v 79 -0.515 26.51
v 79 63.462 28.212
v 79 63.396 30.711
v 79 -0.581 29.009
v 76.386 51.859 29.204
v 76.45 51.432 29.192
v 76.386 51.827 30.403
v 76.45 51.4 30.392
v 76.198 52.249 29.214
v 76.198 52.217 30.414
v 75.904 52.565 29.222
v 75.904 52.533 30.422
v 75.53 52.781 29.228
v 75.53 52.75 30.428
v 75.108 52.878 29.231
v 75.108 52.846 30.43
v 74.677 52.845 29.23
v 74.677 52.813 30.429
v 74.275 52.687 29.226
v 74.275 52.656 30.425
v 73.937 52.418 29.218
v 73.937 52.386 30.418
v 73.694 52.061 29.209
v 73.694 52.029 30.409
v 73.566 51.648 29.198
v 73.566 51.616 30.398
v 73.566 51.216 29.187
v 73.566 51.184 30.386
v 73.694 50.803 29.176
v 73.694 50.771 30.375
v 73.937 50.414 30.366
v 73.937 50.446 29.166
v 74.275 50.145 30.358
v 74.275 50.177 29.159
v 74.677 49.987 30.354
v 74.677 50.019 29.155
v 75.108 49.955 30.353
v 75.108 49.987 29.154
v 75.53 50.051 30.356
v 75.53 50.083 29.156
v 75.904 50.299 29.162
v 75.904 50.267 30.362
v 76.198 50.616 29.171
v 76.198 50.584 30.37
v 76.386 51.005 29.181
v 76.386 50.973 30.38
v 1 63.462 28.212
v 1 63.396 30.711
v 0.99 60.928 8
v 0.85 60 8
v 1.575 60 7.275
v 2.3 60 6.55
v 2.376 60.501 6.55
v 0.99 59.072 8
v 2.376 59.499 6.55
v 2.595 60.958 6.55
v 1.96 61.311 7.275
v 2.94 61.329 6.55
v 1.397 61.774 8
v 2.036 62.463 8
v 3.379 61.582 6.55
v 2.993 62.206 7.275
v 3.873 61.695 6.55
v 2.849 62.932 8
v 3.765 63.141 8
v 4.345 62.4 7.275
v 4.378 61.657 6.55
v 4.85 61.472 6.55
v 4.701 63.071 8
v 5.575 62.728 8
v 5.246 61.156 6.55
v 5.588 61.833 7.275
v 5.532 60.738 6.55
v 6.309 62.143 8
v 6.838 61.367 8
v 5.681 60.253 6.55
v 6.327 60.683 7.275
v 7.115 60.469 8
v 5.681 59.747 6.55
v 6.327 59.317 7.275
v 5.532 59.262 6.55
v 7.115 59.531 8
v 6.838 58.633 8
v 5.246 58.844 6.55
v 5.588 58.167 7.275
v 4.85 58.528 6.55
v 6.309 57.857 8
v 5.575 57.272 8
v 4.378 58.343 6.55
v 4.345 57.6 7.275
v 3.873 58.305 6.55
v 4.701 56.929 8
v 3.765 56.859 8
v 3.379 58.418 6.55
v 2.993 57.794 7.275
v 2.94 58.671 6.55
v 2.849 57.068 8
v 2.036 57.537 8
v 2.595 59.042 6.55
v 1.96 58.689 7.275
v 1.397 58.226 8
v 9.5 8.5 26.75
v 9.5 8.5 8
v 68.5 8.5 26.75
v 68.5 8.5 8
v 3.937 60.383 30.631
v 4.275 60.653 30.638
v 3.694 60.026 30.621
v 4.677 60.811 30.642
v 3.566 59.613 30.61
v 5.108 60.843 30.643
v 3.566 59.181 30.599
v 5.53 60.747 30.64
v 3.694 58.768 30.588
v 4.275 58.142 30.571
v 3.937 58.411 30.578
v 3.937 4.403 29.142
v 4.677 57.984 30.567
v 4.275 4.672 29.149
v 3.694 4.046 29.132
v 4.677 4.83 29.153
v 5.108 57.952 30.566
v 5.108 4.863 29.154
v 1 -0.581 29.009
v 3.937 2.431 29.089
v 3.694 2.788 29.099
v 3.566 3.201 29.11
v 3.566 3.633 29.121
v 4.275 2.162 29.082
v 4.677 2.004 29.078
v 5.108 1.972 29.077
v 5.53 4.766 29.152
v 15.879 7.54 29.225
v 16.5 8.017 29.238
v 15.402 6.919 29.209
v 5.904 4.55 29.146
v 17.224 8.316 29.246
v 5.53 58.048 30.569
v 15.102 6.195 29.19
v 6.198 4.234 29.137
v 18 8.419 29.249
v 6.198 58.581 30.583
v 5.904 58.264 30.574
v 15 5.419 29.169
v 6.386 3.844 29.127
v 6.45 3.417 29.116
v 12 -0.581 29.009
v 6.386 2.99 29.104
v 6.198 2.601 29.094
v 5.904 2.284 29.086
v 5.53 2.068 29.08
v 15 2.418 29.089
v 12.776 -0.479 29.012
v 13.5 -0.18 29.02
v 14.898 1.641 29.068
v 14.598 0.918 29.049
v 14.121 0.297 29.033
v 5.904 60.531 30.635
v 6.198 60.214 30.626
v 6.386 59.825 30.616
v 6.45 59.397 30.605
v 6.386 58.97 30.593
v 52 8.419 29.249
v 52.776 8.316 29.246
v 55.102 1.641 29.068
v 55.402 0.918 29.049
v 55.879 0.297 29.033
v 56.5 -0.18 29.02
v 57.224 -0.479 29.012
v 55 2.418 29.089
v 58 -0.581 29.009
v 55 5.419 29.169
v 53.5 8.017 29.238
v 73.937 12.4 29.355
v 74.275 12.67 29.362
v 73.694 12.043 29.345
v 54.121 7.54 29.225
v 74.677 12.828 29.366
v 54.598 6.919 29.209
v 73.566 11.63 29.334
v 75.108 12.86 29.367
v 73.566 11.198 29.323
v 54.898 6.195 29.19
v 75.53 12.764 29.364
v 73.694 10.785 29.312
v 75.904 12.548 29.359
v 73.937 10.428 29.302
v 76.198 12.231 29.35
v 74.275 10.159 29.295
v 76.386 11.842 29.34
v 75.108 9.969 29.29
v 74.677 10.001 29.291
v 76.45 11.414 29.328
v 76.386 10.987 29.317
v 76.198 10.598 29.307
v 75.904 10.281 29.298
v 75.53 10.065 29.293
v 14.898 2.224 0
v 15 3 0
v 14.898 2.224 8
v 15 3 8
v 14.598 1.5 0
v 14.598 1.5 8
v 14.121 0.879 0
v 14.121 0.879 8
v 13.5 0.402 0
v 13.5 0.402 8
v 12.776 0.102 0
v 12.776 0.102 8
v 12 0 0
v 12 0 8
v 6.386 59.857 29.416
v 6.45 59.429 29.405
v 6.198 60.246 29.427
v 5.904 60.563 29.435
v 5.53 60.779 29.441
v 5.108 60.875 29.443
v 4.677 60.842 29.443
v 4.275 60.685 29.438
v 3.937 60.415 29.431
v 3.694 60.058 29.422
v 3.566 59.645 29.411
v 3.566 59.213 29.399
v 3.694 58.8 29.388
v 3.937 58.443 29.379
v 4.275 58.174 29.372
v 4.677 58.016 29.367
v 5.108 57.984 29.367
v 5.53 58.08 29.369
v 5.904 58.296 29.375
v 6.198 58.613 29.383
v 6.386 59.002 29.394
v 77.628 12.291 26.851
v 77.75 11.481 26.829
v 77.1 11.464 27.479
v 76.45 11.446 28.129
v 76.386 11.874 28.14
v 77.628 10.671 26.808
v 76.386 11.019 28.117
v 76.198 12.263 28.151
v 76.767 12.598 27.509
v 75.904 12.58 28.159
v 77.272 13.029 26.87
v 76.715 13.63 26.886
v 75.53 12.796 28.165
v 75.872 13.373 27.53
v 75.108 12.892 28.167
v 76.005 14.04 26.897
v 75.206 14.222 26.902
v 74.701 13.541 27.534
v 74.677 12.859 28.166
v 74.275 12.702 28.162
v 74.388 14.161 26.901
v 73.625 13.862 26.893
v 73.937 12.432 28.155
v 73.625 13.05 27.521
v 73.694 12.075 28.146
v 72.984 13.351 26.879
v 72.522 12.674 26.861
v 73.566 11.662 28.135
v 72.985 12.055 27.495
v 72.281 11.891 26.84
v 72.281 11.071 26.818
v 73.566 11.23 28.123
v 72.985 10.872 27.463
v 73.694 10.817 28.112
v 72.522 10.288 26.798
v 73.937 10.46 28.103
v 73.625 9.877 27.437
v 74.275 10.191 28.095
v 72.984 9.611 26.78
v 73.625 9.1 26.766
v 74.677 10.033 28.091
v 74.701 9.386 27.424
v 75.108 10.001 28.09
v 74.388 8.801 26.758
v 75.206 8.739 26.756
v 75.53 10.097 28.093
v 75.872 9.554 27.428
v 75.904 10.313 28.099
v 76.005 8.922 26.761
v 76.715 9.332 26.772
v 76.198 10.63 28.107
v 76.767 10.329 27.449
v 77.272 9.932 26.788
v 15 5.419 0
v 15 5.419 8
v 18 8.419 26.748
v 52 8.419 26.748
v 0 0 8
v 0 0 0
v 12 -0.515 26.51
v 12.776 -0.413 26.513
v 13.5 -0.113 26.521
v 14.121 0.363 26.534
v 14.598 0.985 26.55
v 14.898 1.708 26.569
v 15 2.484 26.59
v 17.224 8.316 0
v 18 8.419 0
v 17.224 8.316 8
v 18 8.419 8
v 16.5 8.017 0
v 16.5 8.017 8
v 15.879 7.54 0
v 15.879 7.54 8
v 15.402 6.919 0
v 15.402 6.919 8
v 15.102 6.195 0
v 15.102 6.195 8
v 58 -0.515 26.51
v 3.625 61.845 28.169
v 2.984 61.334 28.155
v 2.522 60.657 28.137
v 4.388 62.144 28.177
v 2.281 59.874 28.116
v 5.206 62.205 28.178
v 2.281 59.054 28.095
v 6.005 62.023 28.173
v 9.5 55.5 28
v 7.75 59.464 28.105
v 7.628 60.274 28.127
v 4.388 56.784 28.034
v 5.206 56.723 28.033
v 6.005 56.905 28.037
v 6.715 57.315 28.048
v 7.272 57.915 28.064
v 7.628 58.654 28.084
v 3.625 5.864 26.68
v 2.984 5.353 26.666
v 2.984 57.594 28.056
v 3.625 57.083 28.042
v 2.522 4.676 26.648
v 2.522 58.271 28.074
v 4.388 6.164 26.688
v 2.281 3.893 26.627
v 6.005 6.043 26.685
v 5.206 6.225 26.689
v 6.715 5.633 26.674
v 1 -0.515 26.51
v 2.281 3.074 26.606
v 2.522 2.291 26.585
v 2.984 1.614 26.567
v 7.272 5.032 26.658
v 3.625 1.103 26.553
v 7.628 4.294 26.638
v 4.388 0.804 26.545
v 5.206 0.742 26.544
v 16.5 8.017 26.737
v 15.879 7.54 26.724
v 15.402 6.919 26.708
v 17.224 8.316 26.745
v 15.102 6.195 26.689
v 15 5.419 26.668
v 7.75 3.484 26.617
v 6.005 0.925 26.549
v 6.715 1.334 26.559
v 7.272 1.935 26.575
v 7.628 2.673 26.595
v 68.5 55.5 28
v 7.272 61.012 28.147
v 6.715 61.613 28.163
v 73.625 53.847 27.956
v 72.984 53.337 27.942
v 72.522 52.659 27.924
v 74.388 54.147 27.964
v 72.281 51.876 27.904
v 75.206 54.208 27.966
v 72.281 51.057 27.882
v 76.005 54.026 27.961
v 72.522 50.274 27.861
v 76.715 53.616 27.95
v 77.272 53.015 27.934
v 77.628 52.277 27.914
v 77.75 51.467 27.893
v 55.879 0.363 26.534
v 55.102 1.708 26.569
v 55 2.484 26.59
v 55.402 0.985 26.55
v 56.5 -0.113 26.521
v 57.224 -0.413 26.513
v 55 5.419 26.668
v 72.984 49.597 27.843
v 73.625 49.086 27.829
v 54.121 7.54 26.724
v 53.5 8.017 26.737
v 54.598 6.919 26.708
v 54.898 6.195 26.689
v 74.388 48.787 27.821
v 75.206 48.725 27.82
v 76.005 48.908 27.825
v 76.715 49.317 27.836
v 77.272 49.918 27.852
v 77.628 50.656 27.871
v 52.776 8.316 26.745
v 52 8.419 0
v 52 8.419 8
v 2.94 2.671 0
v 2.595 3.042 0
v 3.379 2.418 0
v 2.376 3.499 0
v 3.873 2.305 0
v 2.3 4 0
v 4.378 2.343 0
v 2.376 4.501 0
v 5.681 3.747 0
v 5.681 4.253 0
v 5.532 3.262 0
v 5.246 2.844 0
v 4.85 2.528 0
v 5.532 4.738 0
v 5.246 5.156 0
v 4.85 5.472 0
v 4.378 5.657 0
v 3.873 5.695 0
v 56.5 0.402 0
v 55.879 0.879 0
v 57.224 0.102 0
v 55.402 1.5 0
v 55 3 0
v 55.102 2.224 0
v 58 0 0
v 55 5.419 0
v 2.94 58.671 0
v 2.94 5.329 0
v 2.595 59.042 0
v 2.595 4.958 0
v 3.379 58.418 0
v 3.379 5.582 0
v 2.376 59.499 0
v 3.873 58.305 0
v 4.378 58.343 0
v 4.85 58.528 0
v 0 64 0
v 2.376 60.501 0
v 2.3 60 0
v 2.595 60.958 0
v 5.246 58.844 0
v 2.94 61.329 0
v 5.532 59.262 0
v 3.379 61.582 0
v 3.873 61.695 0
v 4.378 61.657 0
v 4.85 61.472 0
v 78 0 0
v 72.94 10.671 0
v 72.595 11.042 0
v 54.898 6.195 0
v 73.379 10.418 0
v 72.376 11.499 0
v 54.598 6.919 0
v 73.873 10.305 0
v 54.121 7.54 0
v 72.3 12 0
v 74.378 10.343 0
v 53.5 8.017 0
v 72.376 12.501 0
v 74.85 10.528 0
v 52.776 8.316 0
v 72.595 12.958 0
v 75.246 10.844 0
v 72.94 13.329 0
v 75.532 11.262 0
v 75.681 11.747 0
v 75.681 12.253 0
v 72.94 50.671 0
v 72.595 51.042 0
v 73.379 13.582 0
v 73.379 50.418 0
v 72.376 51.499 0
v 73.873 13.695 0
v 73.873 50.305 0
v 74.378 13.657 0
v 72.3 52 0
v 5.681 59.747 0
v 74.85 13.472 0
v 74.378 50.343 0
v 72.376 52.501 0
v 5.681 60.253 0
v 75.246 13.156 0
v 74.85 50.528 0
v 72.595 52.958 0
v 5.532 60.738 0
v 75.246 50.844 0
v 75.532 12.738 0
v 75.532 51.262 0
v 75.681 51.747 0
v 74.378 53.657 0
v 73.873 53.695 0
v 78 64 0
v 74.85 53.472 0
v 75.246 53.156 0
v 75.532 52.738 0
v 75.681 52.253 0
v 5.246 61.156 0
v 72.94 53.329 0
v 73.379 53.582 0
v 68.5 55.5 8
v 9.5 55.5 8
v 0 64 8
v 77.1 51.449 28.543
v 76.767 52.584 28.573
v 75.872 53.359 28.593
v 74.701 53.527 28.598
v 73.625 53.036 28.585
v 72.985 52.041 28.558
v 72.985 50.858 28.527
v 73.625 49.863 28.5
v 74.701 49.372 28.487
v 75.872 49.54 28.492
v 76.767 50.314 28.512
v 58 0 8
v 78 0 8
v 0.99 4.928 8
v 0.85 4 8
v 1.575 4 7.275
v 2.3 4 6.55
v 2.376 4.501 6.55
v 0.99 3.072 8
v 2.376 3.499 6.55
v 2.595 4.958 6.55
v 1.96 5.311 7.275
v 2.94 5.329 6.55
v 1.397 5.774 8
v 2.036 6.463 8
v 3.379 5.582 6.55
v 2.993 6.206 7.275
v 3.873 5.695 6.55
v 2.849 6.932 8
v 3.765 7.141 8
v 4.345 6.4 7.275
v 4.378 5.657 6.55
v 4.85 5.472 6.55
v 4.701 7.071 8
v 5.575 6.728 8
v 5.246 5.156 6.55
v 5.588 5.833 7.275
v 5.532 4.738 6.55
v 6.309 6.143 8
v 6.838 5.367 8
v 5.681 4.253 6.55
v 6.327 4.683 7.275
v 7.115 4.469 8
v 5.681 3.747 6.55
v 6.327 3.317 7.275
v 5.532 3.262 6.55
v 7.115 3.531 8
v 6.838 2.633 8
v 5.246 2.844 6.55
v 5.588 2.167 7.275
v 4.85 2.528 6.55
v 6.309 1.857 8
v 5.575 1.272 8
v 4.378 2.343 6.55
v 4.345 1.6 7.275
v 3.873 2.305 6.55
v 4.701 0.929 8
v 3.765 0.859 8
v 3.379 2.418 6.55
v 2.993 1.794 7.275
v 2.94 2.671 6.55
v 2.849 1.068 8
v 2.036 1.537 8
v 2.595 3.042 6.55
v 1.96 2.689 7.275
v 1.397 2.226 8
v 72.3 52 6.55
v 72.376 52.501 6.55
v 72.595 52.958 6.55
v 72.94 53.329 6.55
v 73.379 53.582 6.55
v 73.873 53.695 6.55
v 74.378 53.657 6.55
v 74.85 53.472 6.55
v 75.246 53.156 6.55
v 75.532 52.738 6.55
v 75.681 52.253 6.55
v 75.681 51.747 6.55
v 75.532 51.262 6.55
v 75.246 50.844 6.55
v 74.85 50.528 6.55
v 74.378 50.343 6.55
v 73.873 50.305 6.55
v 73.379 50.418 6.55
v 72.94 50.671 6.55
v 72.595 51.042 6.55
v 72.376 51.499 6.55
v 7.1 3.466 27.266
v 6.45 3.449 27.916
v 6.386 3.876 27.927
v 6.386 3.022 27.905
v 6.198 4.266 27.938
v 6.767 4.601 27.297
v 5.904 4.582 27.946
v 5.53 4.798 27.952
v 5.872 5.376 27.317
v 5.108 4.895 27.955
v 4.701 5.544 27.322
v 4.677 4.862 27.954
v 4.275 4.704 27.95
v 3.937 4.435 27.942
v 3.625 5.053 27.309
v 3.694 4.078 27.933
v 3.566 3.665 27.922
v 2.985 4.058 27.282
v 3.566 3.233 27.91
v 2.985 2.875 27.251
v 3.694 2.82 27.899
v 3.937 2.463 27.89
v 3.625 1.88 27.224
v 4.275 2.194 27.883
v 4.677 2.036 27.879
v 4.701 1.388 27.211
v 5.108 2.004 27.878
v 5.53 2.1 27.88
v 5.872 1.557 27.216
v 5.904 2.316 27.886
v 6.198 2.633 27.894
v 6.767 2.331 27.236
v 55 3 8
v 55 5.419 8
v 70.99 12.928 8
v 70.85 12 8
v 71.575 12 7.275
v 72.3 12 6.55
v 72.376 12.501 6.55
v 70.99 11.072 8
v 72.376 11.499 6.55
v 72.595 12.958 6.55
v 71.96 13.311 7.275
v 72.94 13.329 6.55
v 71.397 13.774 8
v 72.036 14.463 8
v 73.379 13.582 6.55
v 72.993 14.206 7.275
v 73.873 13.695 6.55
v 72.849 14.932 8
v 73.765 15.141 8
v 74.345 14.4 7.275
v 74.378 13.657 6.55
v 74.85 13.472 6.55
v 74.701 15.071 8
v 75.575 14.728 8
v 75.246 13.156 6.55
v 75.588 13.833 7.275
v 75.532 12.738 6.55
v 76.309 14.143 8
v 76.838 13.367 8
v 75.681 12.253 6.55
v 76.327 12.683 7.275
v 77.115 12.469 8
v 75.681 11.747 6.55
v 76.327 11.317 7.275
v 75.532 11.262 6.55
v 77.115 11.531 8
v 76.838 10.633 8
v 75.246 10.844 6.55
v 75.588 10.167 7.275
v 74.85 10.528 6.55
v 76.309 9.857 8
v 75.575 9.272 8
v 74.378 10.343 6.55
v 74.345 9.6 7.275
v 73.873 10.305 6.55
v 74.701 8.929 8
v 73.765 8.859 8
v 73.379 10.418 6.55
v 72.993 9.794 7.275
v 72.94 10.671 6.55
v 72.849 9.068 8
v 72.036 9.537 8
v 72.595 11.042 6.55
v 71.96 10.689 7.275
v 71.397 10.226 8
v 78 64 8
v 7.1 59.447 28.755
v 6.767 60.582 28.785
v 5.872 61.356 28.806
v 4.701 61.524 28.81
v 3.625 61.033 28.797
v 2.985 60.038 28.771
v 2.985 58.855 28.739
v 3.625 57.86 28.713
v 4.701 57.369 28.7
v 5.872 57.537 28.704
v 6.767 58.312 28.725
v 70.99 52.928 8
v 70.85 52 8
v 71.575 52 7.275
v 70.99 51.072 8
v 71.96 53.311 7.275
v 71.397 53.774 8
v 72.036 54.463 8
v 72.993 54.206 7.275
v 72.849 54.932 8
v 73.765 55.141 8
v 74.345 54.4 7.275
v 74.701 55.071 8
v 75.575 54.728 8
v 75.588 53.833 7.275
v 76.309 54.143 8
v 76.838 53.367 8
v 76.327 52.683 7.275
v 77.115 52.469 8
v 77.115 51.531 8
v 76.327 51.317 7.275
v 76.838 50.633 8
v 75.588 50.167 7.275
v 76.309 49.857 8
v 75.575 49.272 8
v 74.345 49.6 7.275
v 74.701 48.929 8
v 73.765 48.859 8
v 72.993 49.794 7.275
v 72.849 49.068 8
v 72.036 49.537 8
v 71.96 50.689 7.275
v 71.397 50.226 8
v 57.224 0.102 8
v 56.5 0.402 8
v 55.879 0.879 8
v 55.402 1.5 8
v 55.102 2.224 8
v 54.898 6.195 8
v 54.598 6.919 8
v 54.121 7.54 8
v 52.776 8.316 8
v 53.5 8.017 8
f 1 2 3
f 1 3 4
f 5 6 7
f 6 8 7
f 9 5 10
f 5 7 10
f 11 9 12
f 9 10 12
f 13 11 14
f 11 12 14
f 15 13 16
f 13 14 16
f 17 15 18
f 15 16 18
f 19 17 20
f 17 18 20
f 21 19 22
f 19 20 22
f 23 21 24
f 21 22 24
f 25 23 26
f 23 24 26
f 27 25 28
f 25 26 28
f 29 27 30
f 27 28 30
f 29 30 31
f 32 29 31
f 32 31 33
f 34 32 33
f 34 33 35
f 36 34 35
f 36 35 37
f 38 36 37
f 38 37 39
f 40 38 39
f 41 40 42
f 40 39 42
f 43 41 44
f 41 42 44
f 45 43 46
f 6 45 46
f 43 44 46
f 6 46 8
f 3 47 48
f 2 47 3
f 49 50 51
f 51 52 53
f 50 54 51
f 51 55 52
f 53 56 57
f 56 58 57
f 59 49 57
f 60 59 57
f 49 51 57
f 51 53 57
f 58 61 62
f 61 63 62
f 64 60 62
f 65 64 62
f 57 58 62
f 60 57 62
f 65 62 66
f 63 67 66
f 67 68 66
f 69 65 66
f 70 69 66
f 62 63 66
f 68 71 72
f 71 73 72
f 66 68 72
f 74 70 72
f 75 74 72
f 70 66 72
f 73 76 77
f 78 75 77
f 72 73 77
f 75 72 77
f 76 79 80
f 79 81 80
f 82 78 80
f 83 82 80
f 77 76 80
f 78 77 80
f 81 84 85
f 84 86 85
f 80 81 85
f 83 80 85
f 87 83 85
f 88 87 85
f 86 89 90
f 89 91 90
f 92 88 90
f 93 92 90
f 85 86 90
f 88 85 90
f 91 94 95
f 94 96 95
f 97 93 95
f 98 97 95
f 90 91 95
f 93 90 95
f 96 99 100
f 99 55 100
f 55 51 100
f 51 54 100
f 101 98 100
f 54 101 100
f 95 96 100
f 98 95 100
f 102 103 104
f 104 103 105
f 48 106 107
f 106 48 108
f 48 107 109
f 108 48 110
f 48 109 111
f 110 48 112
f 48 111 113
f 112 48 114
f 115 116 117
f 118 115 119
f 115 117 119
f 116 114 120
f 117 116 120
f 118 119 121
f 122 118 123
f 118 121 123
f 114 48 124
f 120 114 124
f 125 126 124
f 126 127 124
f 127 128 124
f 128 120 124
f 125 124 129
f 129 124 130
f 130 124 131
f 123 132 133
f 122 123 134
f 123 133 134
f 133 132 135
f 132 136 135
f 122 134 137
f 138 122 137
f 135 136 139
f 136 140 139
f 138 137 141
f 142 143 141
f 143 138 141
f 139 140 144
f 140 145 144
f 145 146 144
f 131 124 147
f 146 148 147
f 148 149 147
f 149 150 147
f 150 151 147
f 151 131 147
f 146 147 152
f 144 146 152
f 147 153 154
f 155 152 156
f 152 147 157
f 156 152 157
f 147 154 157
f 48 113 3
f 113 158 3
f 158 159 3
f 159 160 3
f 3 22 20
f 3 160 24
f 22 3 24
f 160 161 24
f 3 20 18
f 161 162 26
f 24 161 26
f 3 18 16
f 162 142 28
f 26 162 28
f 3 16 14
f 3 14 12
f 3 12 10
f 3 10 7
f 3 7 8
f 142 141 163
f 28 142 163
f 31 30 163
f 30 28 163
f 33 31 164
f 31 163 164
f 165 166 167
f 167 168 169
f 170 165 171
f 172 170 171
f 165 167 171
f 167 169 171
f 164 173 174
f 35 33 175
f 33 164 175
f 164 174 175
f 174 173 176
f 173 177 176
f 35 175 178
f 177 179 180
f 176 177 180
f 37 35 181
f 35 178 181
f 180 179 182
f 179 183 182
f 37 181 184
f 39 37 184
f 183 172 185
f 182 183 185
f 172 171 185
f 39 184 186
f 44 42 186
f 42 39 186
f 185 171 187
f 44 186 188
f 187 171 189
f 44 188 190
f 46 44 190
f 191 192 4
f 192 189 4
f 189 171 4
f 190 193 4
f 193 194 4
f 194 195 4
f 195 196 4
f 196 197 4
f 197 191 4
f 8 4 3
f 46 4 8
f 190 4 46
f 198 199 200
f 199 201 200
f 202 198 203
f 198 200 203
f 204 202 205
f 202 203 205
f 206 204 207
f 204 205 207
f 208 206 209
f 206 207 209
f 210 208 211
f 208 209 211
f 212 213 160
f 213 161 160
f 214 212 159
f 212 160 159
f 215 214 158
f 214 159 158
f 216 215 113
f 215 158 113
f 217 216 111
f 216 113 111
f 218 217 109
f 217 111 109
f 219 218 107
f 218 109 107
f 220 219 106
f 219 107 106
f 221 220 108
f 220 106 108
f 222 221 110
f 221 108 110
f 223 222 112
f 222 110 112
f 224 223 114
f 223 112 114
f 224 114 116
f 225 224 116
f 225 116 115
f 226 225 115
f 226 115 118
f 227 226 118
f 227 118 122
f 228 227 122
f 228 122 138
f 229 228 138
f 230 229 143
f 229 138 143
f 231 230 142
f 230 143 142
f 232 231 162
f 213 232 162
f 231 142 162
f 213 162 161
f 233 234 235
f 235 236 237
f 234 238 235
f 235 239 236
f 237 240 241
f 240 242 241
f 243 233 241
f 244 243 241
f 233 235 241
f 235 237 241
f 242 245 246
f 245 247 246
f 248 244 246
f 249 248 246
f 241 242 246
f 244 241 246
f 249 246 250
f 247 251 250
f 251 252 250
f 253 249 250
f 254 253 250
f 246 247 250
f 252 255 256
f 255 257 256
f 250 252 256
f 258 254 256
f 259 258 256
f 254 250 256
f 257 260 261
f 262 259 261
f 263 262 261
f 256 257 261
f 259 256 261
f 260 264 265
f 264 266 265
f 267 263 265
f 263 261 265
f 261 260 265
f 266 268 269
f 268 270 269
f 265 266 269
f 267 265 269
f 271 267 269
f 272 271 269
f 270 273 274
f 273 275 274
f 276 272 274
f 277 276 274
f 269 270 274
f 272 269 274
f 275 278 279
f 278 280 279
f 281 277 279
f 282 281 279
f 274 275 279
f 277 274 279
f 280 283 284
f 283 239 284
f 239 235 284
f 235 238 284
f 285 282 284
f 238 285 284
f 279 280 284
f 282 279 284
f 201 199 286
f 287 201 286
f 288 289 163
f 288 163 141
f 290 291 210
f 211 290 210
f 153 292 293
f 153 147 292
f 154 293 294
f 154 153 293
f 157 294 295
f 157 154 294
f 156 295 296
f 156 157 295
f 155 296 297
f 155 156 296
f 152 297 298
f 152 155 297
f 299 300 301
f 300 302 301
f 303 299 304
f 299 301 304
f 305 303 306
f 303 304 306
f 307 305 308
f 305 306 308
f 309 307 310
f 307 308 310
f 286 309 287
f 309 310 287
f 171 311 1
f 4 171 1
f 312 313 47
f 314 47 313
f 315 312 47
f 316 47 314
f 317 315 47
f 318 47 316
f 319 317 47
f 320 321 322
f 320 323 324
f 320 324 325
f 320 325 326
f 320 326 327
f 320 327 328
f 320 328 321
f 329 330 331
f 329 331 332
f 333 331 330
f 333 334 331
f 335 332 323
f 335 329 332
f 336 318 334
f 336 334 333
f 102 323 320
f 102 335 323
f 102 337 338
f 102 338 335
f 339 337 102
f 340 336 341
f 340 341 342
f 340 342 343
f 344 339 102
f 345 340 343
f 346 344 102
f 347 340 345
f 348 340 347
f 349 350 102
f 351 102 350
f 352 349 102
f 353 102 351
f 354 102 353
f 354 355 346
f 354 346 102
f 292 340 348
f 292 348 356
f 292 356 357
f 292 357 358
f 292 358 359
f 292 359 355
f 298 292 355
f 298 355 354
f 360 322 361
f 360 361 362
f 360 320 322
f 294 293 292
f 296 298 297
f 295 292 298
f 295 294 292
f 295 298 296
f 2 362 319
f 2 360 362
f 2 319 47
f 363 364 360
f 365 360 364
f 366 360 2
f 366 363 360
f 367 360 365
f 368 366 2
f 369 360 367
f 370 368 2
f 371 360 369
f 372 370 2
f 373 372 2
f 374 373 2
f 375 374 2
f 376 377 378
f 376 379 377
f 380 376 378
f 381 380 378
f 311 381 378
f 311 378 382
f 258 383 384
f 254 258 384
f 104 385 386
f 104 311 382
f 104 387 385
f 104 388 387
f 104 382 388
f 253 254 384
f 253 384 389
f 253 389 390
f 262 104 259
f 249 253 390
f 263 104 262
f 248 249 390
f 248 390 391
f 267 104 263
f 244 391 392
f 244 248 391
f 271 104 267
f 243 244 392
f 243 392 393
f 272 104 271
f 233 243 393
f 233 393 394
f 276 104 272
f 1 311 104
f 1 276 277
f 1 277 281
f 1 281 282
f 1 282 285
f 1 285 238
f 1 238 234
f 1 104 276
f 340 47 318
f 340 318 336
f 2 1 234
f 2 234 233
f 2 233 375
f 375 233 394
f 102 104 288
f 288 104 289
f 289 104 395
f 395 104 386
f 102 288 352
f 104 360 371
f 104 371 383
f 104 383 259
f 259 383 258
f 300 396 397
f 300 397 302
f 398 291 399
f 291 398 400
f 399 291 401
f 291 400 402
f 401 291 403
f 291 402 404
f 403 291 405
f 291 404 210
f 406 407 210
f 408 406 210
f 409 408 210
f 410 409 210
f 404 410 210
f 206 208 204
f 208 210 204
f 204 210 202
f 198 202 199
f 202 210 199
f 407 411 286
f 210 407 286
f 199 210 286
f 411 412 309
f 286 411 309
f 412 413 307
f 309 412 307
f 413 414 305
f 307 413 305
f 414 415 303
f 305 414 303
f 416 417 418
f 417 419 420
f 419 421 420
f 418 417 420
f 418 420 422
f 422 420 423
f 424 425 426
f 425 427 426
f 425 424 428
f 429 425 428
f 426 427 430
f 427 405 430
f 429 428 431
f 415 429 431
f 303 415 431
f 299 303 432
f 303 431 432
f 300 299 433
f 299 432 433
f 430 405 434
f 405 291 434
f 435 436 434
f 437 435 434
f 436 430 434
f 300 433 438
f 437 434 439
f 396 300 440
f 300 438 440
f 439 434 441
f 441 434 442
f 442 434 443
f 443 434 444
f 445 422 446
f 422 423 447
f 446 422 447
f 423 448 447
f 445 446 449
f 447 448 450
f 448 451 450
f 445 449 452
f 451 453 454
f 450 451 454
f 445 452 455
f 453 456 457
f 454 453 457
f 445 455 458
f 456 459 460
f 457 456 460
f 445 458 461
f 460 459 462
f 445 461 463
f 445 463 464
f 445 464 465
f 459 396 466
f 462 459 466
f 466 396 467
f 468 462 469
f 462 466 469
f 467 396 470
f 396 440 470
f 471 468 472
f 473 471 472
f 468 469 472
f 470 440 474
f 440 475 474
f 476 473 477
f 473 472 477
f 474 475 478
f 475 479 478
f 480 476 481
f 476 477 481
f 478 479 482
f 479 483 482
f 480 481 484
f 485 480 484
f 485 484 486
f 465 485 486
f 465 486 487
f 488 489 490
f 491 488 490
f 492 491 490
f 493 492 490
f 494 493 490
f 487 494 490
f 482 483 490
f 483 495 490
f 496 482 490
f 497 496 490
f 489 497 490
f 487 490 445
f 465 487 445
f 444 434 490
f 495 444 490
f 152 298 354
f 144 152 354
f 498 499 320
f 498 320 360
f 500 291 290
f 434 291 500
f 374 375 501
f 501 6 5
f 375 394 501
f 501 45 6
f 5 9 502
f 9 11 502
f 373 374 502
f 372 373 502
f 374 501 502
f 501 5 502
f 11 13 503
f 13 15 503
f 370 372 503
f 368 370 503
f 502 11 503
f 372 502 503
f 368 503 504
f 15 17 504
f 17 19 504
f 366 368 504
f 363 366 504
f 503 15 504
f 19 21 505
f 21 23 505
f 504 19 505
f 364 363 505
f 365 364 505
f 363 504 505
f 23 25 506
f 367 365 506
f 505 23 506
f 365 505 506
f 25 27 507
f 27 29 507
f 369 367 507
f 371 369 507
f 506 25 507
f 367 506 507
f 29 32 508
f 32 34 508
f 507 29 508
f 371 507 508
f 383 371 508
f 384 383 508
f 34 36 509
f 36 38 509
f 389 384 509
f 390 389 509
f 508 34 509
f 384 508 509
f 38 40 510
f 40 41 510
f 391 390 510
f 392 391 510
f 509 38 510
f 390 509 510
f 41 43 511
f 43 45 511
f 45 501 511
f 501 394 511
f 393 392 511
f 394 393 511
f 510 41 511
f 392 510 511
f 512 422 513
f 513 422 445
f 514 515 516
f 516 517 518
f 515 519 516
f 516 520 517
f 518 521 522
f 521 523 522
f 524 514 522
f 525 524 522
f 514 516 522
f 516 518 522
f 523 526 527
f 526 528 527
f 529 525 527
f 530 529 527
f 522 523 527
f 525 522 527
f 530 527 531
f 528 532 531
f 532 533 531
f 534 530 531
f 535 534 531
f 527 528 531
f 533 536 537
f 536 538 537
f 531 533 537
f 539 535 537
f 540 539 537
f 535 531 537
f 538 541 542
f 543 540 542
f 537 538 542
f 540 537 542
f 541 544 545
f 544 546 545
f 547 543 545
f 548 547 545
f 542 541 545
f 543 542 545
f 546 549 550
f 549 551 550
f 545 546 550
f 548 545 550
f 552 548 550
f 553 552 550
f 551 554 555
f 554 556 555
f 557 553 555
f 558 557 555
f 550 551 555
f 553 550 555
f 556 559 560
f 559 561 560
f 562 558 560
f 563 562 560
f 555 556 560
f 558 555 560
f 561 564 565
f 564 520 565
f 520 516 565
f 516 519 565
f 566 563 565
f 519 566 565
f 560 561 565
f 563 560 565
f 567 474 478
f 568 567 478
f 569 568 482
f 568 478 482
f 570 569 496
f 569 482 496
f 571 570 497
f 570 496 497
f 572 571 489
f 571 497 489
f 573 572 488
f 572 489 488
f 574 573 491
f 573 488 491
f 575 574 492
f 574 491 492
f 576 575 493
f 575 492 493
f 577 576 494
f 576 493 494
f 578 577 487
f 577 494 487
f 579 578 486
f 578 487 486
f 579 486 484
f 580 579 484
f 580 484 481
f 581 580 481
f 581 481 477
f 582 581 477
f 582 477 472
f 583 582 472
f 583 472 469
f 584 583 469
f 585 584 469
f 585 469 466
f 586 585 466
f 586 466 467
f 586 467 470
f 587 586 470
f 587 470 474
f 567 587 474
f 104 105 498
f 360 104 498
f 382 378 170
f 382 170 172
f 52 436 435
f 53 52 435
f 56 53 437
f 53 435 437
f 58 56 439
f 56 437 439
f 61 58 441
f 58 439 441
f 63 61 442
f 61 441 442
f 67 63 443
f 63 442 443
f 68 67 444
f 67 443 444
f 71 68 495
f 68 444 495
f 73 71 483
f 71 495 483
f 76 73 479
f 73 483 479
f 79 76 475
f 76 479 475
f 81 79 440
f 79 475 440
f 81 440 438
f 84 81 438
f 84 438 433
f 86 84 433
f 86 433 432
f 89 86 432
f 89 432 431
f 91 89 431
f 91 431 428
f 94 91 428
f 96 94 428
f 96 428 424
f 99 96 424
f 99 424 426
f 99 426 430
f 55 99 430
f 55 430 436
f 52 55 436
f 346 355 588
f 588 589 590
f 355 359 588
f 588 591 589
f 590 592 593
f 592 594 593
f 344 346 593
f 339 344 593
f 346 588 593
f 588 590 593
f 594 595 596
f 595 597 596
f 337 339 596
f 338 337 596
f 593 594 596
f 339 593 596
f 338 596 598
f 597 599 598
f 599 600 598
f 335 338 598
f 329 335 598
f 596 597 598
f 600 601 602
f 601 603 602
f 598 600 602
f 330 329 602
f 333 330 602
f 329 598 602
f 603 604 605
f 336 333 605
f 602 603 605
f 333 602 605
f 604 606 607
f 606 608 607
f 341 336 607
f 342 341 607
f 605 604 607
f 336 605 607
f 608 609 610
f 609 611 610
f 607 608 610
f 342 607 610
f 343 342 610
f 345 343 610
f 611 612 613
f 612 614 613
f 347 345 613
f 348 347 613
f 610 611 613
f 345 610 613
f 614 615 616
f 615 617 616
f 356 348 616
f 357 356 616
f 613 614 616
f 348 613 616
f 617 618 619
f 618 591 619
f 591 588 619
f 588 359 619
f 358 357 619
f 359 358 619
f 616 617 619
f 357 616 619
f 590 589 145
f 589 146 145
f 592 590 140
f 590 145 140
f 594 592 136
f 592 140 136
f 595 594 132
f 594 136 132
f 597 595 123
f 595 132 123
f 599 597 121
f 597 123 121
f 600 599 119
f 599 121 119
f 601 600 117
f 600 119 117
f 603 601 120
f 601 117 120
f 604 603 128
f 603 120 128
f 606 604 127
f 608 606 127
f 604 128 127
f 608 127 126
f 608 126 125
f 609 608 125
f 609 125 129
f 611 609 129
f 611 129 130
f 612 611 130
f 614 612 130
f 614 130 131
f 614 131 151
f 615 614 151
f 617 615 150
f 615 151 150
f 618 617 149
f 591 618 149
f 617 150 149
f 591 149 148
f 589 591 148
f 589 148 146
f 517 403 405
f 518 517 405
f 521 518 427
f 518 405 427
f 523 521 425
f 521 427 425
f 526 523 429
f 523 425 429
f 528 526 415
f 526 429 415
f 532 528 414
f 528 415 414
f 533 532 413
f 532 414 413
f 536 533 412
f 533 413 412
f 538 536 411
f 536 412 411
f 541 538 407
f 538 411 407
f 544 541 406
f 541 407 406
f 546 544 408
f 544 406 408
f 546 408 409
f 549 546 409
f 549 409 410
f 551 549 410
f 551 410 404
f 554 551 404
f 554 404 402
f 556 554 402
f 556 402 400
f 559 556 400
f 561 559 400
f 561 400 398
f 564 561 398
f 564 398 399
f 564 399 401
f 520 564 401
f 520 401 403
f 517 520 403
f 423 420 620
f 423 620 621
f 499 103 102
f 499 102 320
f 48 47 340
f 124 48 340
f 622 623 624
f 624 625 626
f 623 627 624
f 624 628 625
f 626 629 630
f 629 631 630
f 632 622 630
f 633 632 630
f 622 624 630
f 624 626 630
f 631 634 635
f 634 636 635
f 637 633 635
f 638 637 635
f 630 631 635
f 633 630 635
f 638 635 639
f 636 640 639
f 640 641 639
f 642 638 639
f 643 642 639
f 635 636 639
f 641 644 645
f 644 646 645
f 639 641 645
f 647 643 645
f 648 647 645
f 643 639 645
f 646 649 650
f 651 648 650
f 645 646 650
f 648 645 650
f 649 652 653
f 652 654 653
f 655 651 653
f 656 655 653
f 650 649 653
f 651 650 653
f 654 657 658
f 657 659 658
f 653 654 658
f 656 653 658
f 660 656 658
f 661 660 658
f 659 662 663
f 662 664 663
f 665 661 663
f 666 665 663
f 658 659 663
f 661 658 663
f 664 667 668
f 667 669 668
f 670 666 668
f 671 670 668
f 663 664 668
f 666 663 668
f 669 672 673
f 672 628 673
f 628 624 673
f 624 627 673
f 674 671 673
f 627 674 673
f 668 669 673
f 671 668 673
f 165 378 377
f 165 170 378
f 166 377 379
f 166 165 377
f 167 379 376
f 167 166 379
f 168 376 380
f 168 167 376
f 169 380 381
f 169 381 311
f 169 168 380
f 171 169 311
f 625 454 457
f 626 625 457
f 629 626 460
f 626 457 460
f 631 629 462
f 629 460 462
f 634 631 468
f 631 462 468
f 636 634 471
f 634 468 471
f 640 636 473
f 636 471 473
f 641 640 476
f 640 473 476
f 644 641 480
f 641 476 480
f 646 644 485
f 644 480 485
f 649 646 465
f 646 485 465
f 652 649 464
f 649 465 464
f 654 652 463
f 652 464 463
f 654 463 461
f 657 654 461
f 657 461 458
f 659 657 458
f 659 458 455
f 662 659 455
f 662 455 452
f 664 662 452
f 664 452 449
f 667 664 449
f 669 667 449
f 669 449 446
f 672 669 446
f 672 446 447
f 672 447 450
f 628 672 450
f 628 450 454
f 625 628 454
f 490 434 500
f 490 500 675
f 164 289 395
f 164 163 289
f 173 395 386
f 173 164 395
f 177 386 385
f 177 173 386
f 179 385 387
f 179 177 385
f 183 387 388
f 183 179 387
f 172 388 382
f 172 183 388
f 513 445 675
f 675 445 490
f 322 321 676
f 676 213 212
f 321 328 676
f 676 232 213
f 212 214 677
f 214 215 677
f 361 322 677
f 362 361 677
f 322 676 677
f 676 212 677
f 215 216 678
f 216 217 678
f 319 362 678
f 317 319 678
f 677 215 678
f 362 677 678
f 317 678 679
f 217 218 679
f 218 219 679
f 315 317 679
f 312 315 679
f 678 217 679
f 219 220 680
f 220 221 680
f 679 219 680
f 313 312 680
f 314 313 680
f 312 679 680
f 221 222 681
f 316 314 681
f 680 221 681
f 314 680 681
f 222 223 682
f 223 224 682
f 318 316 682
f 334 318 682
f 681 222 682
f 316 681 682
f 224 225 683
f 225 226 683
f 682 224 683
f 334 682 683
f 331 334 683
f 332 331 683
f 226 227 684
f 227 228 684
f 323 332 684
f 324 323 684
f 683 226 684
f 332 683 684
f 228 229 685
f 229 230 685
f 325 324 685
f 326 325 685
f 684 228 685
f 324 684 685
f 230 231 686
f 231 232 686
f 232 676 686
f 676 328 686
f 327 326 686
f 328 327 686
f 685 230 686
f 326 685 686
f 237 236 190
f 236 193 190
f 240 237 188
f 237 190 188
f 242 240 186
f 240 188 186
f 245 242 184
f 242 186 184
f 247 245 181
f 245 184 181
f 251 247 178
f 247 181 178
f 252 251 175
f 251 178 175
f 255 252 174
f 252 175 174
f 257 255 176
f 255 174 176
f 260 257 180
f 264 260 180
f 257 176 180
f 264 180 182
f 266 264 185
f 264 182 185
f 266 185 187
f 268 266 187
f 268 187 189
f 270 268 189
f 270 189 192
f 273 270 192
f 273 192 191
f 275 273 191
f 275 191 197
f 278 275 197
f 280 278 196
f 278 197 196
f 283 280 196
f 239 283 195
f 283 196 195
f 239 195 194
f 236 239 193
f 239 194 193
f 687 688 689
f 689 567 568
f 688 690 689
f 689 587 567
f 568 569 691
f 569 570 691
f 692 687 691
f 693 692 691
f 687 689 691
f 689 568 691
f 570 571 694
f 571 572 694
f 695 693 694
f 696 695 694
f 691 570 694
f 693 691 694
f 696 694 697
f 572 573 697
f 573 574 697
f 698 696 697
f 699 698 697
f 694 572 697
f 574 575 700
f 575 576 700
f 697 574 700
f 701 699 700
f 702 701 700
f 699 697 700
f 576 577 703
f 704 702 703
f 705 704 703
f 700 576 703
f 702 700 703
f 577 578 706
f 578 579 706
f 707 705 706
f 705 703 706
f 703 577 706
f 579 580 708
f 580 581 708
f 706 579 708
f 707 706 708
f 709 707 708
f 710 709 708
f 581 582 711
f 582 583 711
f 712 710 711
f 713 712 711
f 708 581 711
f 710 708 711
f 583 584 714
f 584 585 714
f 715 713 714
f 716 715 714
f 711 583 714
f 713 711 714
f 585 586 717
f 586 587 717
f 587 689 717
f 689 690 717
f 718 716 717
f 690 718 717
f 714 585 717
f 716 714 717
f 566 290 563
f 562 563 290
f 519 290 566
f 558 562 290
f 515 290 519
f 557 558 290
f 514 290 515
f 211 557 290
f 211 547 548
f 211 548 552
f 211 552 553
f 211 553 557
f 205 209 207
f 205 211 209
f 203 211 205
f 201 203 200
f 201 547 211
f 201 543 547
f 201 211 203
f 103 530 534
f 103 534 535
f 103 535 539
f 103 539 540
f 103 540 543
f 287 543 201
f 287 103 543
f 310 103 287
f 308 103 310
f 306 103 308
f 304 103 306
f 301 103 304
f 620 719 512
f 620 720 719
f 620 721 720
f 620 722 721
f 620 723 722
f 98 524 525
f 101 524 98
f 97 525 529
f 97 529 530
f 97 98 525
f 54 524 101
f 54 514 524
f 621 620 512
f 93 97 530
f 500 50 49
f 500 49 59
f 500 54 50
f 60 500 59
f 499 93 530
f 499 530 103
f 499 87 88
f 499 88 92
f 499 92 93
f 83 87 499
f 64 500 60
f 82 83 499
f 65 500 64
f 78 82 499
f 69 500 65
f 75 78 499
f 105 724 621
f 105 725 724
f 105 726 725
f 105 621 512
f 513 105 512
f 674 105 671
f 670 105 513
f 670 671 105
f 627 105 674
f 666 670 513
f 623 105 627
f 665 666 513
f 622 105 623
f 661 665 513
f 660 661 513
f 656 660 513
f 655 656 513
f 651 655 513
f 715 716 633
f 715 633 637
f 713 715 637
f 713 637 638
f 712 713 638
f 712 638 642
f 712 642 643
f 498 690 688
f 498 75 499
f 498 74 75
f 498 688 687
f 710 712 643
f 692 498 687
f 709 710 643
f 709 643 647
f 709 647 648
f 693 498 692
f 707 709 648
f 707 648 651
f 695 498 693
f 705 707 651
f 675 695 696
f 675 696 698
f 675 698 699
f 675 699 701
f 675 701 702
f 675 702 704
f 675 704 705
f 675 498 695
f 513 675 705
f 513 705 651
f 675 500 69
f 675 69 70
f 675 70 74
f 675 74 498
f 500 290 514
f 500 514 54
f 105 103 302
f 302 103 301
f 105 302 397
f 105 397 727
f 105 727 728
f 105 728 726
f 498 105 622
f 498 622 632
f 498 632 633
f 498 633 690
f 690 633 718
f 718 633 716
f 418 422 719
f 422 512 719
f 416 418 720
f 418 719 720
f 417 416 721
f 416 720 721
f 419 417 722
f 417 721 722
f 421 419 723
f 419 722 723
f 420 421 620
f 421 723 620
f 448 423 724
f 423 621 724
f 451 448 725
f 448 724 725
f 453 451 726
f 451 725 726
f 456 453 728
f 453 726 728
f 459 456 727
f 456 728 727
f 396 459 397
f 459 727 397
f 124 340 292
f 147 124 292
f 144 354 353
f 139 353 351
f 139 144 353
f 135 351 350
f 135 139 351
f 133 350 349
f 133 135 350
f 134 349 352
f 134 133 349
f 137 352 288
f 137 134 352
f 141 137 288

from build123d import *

# Parameters (mm, degrees)
ESQUISSE1_W                                      = 78
ESQUISSE1_H                                      = 64
ESQUISSE1_R                                      = 1.5
BOSS_EXTRU_1_DEPTH                               = 8
FRAISAGE_POUR_VIS_T_TE_FRAIS_E_M31_D             = 3.4
FRAISAGE_POUR_VIS_T_TE_FRAIS_E_M31_DEPTH         = 8
FRAISAGE_POUR_VIS_T_TE_FRAIS_E_M31_CSINK_D       = 6.3
FRAISAGE_POUR_VIS_T_TE_FRAIS_E_M31_CSINK_ANGLE   = 90
ESQUISSE4_W                                      = 59
ESQUISSE4_H                                      = 47
BOSS_EXTRU_2_DEPTH                               = 20
ENL_V_START                                      = -27.764118658
ENL_V_MAT_EXTRU_1_OUTLINE_W                      = 62
ENL_V_MAT_EXTRU_1_OUTLINE_H                      = 50
ENL_V_MAT_EXTRU_1_DEPTH                          = 1.24955815
ESQUISSE14_W                                     = 78
ESQUISSE14_H                                     = 64
ESQUISSE14_R                                     = 1
BOSS_EXTRU_4_DEPTH                               = 2.5
FRAISAGE_POUR_VIS_T_TE_FRAIS_E_M2_53_D           = 2.9
FRAISAGE_POUR_VIS_T_TE_FRAIS_E_M2_53_DEPTH       = 2.5
FRAISAGE_POUR_VIS_T_TE_FRAIS_E_M2_53_CSINK_D     = 5.5
FRAISAGE_POUR_VIS_T_TE_FRAIS_E_M2_53_CSINK_ANGLE = 90
FRAISAGE_POUR_VIS_T_TE_FRAIS_E_M2_53_TIP         = 0.871247898
ENL_V_MAT_EXTRU_2_REACH                          = 108.208
ESQUISSE20_W                                     = 40
ESQUISSE20_H                                     = 10
CONG_1_R                                         = 3


# Read off the part's stored shape, not the designer's step: Enlèv. mat.-Extru.1
with BuildPart() as part:
    # Esquisse1 → Boss.-Extru.1 (new body)
    with BuildSketch(Plane.XY):
        with Locations((39, 32)):
            Rectangle(ESQUISSE1_W, ESQUISSE1_H)
        with Locations((4, 60)):
            Circle(ESQUISSE1_R, mode=Mode.SUBTRACT)
        with Locations((4, 4)):
            Circle(ESQUISSE1_R, mode=Mode.SUBTRACT)
        with Locations((74, 12)):
            Circle(ESQUISSE1_R, mode=Mode.SUBTRACT)
        with Locations((74, 52)):
            Circle(ESQUISSE1_R, mode=Mode.SUBTRACT)
    extrude(amount=BOSS_EXTRU_1_DEPTH)

    # Fraisage pour vis à tête fraisée M31
    with Locations(Plane.XY.offset(8)):
        with Locations((4, 60), (4, 4), (74, 12), (74, 52)):
            CounterSinkHole(FRAISAGE_POUR_VIS_T_TE_FRAIS_E_M31_D / 2, FRAISAGE_POUR_VIS_T_TE_FRAIS_E_M31_CSINK_D / 2, depth=FRAISAGE_POUR_VIS_T_TE_FRAIS_E_M31_DEPTH, counter_sink_angle=FRAISAGE_POUR_VIS_T_TE_FRAIS_E_M31_CSINK_ANGLE)

    # Esquisse4 → Boss.-Extru.2 (add)
    with BuildSketch(Plane.XY.offset(8)):
        with Locations((39, 32)):
            Rectangle(ESQUISSE4_W, ESQUISSE4_H)
    extrude(amount=BOSS_EXTRU_2_DEPTH)

    # Enlèv. mat.-Extru.1 outline → Enlèv. mat.-Extru.1 (cut)
    with BuildSketch(Plane(origin=(0, 0, 0), x_dir=(1, 0, 0), z_dir=(0, 0.026586343635431896, -0.9996465206922389)).offset(ENL_V_START)):
        with Locations((39, -33)):
            Rectangle(ENL_V_MAT_EXTRU_1_OUTLINE_W, ENL_V_MAT_EXTRU_1_OUTLINE_H)
    extrude(amount=ENL_V_MAT_EXTRU_1_DEPTH, mode=Mode.SUBTRACT)

    # Esquisse14 → Boss.-Extru.4 (add)
    with BuildSketch(Plane(origin=(0, 17.262764885, 26.983052258), x_dir=(1, 0, 0), z_dir=(0, 0.026586343635431917, -0.9996465206922389))):
        with Locations((40, -14.216024519)):
            Rectangle(ESQUISSE14_W, ESQUISSE14_H)
        with Locations(Location((5, 13.783975481, 0), (0, 0, 270))):
            Circle(ESQUISSE14_R, mode=Mode.SUBTRACT)
        with Locations(Location((5, -42.216024519, 0), (0, 0, 270))):
            Circle(ESQUISSE14_R, mode=Mode.SUBTRACT)
        with Locations(Location((75, -34.216024519, 0), (0, 0, 270))):
            Circle(ESQUISSE14_R, mode=Mode.SUBTRACT)
        with Locations(Location((75, 5.783975481, 0), (0, 0, 270))):
            Circle(ESQUISSE14_R, mode=Mode.SUBTRACT)
    extrude(amount=-BOSS_EXTRU_4_DEPTH)

    # Fraisage pour vis à tête fraisée M2.53
    with Locations(Plane(origin=(0, -0.704925217, 26.505188159), x_dir=(-1, 0, 0), z_dir=(0, 0.02658634363543186, -0.9996465206922389))):
        with Locations((-5, 60.190068073), (-5, 4.190068073), (-75, 12.190068073), (-75, 52.190068073)):
            CounterSinkHole(FRAISAGE_POUR_VIS_T_TE_FRAIS_E_M2_53_D / 2, FRAISAGE_POUR_VIS_T_TE_FRAIS_E_M2_53_CSINK_D / 2, depth=FRAISAGE_POUR_VIS_T_TE_FRAIS_E_M2_53_DEPTH, counter_sink_angle=FRAISAGE_POUR_VIS_T_TE_FRAIS_E_M2_53_CSINK_ANGLE)
            with Locations((0, 0, -(FRAISAGE_POUR_VIS_T_TE_FRAIS_E_M2_53_DEPTH + FRAISAGE_POUR_VIS_T_TE_FRAIS_E_M2_53_TIP / 2))):  # 118° drill point
                Cone(0, FRAISAGE_POUR_VIS_T_TE_FRAIS_E_M2_53_D / 2, FRAISAGE_POUR_VIS_T_TE_FRAIS_E_M2_53_TIP, mode=Mode.SUBTRACT)

    # Enlèv. mat.-Extru.2: up to this plane
    enl_v_mat_extru_2_end = Plane(origin=(0, -0.771391076, 29.004304461), z_dir=(0, -0.026586343635431952, 0.9996465206922389))
    # Esquisse20 → Enlèv. mat.-Extru.2 (cut, up to the surface)
    with BuildSketch(Plane(origin=(0, 0, 0), x_dir=(-1, 0, 0), z_dir=(0, 0, -1)), mode=Mode.PRIVATE) as enl_v_mat_extru_2_sk1:
        with Locations((-35, 3.418609812)):
            Rectangle(ESQUISSE20_W, ESQUISSE20_H)
    enl_v_mat_extru_2_tool1 = split(extrude(enl_v_mat_extru_2_sk1.sketch, amount=-ENL_V_MAT_EXTRU_2_REACH, mode=Mode.PRIVATE), bisect_by=enl_v_mat_extru_2_end, keep=Keep.BOTH, mode=Mode.PRIVATE)
    add(enl_v_mat_extru_2_tool1.solids().sort_by_distance((35, 3.41861, 0))[0], mode=Mode.SUBTRACT)

    # Congé1
    cong_1_edges = [part.edges().sort_by_distance(p)[0] for p in [
        (15, -0.548157258, 27.759799525),
        (55, -0.548157258, 27.759799525),
        (55, 8.418609812, 4),
        (55, 8.418609812, 27.998277373),
        (55, 0, 4),
        (15, 0, 4),
        (15, 8.418609812, 4),
        (15, 8.418609812, 27.998277373),
    ]]
    fillet(cong_1_edges, radius=CONG_1_R)


solid = part.part
